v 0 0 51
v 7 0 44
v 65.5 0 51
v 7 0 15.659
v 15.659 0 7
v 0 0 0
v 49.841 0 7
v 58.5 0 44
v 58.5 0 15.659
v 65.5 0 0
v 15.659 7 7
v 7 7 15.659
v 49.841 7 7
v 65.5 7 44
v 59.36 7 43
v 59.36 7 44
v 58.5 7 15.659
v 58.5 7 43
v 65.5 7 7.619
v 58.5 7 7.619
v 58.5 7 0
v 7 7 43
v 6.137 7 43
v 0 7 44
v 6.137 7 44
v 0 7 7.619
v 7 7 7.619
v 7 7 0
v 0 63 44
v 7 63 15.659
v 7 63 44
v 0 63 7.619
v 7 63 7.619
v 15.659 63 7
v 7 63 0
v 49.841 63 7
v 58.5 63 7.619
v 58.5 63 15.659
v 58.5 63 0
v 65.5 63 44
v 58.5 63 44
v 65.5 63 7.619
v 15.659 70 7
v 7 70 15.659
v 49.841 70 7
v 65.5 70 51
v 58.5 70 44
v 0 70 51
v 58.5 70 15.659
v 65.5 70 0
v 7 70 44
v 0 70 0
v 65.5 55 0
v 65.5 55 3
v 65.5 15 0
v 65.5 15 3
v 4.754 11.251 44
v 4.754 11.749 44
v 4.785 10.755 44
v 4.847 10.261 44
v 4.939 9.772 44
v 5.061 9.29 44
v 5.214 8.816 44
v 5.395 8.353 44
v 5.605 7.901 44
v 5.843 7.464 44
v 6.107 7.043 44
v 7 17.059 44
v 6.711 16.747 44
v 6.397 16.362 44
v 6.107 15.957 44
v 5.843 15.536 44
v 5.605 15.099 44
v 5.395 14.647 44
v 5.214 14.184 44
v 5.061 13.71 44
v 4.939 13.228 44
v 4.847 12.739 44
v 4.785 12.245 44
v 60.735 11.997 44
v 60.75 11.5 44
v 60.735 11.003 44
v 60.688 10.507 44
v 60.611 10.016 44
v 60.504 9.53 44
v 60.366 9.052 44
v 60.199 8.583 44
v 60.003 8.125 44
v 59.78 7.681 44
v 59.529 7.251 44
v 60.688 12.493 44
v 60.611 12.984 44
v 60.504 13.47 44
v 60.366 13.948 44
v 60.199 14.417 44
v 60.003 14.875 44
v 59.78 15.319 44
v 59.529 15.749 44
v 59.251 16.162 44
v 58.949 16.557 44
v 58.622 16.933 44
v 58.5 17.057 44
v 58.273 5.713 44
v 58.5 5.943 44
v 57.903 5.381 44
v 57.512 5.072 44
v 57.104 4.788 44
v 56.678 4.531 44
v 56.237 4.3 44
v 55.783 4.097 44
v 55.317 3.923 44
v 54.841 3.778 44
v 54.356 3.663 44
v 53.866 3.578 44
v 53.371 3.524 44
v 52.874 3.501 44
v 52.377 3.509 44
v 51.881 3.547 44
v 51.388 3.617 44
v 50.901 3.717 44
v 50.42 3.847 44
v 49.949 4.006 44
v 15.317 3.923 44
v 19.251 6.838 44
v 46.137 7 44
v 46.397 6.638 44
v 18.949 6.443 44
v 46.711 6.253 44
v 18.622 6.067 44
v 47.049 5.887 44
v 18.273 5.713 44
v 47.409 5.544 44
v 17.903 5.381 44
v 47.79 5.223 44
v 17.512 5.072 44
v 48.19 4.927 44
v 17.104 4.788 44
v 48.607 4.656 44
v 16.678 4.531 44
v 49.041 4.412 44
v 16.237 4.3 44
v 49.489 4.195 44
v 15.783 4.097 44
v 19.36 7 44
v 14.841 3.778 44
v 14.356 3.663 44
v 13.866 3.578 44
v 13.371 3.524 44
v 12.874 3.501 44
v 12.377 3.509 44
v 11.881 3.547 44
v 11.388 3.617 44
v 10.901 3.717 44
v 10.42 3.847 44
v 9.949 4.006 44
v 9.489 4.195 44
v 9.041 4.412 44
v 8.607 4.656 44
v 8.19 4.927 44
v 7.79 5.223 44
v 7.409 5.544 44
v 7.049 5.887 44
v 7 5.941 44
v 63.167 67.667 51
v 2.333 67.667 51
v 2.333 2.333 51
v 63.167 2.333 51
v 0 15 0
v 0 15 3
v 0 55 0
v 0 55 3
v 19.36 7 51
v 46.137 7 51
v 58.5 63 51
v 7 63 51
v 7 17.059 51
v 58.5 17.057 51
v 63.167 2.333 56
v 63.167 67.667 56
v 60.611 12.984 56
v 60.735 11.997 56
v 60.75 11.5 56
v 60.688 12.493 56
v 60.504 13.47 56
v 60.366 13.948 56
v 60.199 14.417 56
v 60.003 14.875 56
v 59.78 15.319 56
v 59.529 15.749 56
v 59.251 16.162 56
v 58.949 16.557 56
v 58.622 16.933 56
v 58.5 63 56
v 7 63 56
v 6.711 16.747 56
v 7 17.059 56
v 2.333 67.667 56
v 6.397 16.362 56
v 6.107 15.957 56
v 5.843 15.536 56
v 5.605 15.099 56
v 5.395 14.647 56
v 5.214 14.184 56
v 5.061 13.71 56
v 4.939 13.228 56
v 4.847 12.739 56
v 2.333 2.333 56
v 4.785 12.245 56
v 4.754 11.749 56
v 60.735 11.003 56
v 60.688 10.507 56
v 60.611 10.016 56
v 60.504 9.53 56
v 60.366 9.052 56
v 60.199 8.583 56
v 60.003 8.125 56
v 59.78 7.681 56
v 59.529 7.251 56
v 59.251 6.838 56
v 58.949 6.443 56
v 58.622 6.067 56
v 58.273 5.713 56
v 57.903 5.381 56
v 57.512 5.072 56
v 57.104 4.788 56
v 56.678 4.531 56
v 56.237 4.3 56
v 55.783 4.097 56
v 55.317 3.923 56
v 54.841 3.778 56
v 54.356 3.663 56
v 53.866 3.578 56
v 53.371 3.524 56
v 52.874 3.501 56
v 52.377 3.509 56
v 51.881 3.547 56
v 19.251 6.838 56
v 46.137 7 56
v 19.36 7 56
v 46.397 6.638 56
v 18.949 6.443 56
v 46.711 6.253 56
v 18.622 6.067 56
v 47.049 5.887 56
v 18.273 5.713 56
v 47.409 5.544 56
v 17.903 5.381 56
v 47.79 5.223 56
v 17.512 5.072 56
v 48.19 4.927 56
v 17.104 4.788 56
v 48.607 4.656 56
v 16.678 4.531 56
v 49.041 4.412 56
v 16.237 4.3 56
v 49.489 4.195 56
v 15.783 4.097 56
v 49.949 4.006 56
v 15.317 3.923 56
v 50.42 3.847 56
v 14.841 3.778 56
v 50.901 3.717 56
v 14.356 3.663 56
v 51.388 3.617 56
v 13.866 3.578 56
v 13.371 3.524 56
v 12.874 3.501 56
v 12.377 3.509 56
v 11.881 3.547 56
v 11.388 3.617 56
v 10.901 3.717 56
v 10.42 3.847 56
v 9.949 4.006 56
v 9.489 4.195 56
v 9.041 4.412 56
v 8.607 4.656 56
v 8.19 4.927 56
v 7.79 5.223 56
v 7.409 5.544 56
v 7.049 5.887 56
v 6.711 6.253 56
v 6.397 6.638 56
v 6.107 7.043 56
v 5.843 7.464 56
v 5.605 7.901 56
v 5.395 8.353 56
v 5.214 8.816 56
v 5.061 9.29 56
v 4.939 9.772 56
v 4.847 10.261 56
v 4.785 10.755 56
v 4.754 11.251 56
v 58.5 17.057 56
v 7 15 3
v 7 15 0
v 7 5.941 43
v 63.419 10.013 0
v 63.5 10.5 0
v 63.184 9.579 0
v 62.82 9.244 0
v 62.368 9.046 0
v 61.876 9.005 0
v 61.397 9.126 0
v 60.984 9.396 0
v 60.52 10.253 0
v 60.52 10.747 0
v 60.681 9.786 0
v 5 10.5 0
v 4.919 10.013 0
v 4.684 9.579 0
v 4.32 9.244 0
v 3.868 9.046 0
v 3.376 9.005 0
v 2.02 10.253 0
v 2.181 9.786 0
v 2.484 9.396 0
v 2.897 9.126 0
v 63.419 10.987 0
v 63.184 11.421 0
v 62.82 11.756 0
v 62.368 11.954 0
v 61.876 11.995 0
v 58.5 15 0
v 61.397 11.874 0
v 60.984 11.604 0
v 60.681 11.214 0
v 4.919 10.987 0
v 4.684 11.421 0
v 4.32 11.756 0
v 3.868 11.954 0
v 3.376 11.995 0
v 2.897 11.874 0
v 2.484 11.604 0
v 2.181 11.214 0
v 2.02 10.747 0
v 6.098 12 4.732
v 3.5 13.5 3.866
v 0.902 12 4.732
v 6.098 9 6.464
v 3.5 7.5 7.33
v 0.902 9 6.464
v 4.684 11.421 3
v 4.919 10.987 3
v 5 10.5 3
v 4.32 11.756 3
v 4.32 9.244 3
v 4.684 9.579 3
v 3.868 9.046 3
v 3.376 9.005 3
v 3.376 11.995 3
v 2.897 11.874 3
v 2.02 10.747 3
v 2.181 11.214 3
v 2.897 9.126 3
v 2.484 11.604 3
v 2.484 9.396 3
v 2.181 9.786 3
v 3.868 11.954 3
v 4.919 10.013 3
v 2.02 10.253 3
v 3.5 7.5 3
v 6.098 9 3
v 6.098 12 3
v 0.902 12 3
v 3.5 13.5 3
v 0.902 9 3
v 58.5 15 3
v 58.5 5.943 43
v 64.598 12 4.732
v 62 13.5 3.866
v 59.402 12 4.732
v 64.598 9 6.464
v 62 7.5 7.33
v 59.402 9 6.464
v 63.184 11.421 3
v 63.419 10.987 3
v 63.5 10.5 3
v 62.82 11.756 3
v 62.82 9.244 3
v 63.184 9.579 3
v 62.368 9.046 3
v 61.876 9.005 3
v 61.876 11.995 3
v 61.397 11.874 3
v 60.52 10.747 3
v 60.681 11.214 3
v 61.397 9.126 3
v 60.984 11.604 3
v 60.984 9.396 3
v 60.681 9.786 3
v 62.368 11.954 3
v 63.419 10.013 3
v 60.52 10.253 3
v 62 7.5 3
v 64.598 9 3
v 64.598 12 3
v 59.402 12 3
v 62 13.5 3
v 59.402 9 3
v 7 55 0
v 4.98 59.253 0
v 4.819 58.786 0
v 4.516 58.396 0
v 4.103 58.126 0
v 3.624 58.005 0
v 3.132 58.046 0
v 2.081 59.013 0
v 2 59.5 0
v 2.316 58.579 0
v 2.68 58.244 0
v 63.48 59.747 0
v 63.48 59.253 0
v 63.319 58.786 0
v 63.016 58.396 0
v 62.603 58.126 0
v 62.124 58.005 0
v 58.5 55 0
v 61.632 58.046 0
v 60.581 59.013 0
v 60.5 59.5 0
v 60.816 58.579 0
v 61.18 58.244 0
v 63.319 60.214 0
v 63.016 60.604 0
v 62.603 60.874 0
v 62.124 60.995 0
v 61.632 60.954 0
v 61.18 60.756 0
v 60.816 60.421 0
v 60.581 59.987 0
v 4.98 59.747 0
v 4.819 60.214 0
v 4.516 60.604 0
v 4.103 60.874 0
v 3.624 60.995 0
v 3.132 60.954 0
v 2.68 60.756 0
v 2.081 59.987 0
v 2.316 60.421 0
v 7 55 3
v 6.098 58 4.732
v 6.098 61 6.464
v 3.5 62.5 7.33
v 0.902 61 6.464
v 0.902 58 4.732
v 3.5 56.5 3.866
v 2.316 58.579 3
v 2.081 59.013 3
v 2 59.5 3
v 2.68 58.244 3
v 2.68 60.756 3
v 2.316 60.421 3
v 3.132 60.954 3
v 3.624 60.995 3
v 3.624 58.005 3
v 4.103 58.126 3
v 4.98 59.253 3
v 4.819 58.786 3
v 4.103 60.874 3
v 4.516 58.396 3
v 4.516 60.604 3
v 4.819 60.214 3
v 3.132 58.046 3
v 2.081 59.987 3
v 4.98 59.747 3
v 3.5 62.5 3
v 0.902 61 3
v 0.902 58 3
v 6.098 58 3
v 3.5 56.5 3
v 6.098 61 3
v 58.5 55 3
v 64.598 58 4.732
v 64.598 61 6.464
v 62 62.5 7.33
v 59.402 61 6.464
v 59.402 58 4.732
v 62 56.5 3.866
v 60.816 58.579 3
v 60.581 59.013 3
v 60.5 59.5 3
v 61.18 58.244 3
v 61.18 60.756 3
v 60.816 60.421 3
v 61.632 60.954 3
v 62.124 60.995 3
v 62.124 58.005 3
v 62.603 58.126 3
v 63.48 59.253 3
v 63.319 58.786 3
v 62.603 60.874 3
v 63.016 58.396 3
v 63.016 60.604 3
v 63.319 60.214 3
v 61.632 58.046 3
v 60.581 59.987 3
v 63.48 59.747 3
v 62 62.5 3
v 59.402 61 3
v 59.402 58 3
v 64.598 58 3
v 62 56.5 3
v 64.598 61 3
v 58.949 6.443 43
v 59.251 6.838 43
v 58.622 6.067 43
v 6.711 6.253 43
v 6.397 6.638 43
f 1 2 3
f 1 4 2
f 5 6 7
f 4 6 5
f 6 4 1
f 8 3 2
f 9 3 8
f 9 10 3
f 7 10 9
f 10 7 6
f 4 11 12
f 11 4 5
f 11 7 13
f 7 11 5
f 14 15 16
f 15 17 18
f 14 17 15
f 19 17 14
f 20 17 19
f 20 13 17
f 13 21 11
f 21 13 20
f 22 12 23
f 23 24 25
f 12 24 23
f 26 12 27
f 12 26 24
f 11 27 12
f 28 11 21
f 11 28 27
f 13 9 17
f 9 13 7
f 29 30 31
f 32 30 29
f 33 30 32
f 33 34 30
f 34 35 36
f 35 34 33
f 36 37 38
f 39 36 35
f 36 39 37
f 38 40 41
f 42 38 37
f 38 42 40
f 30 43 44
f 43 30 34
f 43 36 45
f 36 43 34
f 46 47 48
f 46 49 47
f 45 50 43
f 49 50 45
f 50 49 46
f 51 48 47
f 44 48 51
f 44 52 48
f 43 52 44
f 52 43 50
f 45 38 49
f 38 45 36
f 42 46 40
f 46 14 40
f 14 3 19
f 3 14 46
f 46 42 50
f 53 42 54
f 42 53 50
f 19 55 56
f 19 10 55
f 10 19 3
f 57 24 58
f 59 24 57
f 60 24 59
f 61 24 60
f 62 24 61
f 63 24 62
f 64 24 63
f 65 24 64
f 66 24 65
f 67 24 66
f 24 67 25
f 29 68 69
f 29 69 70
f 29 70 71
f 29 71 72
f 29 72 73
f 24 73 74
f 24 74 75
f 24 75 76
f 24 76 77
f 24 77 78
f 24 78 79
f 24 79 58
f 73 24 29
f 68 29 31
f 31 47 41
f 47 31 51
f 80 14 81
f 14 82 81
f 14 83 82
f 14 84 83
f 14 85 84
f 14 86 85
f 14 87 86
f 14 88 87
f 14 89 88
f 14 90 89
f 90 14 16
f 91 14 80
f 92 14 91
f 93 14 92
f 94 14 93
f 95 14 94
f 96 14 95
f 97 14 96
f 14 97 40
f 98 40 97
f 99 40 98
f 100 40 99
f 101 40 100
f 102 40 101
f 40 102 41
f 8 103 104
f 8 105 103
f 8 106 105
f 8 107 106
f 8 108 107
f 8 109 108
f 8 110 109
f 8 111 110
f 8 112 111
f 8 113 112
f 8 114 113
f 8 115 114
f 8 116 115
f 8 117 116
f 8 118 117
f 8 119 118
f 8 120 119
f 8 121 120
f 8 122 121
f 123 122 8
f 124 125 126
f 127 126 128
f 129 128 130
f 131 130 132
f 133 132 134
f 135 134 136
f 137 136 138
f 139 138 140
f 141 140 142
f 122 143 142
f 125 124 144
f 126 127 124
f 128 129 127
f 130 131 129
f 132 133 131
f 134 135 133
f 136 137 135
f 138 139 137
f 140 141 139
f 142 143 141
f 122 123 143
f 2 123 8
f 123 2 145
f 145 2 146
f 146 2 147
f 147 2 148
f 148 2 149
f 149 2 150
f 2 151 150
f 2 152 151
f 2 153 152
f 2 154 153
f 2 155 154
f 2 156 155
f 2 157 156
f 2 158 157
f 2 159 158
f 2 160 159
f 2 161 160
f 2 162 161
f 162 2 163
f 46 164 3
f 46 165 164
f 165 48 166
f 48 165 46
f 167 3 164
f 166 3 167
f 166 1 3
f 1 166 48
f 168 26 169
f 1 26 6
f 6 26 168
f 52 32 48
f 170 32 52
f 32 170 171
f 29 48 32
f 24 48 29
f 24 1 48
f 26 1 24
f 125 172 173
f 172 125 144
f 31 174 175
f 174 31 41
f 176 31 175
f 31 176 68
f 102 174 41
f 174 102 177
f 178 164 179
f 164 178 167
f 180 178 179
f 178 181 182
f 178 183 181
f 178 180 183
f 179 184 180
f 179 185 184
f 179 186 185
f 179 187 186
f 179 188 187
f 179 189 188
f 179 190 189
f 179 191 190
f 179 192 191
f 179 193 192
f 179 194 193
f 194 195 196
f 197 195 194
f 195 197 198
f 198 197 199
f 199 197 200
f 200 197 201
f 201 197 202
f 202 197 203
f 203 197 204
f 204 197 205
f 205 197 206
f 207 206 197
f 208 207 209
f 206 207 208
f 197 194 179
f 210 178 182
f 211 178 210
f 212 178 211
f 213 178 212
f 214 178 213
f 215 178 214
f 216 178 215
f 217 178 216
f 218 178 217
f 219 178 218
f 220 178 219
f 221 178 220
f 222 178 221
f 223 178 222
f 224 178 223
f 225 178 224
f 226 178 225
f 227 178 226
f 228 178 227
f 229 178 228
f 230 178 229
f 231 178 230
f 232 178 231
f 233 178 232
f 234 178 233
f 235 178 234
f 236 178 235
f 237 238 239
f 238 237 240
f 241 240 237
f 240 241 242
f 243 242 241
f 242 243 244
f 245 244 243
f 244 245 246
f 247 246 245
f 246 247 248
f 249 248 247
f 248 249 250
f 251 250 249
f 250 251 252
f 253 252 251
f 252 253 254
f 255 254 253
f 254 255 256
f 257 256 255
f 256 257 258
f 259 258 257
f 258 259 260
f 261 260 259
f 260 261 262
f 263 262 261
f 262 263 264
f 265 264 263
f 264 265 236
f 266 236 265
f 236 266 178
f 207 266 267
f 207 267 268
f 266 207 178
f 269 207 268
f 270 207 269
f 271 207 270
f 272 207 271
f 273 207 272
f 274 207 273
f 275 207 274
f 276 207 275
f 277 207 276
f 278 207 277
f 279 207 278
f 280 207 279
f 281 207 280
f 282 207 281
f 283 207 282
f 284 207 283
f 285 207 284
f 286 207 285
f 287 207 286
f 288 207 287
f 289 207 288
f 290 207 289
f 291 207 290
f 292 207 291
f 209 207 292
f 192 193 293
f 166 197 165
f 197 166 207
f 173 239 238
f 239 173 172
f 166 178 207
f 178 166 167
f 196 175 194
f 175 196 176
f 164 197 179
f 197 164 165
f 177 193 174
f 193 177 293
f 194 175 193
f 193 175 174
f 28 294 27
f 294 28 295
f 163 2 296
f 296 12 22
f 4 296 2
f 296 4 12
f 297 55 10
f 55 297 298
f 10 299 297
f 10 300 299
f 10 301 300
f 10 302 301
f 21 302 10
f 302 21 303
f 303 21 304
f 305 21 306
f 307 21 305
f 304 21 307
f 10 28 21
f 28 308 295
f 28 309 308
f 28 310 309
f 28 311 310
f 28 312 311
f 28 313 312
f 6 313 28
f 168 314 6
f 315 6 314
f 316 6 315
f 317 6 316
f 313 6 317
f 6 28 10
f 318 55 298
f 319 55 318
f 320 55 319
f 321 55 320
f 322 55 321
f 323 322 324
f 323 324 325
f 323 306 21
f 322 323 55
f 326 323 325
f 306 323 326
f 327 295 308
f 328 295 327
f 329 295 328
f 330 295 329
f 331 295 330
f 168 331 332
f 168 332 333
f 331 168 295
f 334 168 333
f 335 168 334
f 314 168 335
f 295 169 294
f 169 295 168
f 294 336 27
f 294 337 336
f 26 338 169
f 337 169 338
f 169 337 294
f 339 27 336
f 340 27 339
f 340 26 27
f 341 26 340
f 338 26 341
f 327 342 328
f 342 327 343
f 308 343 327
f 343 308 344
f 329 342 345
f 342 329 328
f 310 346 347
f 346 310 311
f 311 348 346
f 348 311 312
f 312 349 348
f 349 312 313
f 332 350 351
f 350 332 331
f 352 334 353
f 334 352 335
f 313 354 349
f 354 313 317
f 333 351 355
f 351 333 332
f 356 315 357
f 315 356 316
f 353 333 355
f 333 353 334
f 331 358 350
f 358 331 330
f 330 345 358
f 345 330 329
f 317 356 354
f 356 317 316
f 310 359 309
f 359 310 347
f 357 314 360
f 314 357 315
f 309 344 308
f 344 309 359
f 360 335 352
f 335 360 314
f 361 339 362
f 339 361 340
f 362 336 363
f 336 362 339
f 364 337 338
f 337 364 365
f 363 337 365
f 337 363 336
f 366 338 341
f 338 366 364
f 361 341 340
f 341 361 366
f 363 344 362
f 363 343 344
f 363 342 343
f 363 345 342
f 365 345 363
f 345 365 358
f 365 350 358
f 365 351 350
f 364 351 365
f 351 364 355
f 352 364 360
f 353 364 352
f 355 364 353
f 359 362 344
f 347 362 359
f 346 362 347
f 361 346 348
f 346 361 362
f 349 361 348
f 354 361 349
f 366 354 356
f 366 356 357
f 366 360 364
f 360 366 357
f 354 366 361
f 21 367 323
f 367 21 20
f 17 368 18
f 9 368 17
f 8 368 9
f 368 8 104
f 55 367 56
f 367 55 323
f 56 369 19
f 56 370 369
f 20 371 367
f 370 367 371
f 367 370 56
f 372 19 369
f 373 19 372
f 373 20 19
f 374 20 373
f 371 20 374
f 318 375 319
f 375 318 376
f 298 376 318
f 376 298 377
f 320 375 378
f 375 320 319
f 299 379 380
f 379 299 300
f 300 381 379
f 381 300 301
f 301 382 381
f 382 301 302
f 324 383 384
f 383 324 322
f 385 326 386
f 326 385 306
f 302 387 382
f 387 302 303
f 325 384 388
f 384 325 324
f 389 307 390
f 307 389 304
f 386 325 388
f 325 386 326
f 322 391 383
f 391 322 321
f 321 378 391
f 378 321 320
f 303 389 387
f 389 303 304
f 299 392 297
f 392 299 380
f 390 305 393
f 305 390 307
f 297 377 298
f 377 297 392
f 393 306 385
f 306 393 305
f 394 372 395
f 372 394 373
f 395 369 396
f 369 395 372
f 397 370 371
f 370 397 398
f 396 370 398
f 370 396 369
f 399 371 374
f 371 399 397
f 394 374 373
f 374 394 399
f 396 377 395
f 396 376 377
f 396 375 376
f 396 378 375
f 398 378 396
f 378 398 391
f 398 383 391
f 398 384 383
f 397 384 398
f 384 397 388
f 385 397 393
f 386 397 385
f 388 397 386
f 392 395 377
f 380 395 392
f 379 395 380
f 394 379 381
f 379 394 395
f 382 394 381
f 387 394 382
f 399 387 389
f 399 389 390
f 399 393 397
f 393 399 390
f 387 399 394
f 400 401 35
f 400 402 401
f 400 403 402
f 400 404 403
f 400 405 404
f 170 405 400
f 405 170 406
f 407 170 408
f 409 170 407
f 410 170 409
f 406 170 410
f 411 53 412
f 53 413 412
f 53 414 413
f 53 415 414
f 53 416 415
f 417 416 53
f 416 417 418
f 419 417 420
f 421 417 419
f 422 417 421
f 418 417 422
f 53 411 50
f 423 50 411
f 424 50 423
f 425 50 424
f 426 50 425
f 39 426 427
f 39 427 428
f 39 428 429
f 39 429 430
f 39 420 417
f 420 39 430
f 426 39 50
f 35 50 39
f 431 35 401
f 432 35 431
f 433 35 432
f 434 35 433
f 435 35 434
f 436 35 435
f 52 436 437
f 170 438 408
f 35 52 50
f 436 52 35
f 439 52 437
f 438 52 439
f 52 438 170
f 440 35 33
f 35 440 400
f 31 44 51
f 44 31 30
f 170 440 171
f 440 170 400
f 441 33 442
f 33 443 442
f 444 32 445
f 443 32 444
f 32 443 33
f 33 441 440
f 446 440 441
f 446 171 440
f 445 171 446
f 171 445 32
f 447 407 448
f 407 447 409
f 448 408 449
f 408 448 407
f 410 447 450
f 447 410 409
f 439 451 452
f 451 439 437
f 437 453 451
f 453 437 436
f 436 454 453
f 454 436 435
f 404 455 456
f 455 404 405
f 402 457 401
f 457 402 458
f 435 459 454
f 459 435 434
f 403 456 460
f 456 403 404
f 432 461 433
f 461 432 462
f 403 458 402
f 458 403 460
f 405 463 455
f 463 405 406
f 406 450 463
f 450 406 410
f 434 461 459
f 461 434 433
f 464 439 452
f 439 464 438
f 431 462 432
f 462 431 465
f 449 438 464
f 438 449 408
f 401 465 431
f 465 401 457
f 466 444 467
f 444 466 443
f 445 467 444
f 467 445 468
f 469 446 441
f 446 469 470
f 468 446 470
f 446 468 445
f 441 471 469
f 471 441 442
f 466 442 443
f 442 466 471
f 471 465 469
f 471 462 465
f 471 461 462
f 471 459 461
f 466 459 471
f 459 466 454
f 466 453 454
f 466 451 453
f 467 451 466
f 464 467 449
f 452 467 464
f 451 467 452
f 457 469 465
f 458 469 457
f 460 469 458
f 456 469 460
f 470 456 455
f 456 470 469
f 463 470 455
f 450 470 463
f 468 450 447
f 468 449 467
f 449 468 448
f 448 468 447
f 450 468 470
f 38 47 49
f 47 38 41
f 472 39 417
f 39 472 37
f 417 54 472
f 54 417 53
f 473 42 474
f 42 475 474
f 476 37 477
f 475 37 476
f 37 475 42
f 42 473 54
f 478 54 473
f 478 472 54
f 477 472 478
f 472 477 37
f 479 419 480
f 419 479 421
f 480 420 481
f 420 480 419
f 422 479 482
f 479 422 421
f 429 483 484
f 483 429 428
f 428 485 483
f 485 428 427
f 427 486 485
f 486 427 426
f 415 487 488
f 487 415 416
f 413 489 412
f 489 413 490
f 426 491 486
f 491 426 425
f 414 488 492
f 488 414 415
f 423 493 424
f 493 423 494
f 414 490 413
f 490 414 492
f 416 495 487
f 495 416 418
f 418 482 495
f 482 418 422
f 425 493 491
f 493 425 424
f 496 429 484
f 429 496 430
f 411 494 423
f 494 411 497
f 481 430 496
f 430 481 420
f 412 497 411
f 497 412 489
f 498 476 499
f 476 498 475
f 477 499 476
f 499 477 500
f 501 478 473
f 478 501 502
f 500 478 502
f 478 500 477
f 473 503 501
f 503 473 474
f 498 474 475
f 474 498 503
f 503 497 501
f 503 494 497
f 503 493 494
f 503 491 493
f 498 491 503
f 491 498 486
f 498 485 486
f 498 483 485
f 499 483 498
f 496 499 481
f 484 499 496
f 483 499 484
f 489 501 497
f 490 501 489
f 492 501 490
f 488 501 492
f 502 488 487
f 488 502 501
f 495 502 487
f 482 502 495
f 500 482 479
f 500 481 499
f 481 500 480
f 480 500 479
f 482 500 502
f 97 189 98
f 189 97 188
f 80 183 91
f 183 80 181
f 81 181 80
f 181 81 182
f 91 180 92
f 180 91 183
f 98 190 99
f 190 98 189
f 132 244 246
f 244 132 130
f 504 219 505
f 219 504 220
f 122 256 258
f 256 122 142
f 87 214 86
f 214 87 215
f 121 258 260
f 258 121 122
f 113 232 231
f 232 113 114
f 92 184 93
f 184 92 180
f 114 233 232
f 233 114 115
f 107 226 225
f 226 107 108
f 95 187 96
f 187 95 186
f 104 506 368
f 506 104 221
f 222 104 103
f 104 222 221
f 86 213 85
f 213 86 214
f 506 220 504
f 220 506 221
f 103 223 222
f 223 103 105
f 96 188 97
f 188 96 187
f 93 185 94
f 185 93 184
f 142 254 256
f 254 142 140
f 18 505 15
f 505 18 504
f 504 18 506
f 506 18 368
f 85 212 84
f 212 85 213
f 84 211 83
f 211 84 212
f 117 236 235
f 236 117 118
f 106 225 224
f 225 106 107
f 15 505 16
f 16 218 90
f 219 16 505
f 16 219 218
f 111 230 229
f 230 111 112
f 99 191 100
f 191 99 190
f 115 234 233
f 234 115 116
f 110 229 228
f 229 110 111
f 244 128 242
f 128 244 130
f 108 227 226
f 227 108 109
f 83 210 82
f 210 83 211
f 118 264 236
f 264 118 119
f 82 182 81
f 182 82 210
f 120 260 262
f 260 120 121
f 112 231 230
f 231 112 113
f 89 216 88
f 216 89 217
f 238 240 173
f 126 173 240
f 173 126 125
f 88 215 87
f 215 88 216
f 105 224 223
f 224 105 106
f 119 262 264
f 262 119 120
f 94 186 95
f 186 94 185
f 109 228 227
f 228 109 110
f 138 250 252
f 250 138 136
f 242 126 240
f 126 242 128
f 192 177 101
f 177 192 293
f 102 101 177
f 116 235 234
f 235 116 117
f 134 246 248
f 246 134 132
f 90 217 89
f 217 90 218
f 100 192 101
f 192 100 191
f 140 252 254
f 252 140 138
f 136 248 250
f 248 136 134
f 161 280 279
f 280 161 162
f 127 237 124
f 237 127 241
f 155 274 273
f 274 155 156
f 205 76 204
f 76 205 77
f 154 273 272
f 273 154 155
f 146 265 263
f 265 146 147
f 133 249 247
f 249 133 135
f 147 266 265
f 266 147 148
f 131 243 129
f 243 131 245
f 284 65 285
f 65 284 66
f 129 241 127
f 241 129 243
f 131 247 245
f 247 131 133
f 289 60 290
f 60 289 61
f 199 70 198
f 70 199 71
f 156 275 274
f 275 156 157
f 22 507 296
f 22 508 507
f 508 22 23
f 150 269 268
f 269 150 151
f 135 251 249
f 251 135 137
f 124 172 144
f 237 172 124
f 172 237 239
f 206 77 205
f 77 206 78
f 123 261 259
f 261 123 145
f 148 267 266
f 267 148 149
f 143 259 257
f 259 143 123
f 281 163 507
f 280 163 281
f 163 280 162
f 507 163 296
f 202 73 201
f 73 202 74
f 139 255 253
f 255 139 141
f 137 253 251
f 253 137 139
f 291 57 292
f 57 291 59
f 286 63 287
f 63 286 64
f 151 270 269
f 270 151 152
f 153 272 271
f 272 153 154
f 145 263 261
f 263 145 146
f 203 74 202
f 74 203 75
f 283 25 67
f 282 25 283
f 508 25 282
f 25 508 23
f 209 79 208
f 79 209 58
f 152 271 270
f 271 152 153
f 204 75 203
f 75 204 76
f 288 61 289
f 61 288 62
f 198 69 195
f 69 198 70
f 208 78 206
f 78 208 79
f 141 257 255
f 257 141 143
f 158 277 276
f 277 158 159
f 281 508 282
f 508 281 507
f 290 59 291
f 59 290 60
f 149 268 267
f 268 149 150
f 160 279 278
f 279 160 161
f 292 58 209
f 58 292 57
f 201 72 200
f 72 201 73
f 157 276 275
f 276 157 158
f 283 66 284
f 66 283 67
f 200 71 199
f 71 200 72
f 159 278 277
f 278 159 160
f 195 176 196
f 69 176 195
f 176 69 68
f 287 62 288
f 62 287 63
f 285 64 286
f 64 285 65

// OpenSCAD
// file: prism.scad
module prism(l, w, h) {
       polyhedron(points=[
               [0,0,h],           // 0    front top corner
               [0,0,0],[w,0,0],   // 1, 2 front left & right bottom corners
               [0,l,h],           // 3    back top corner
               [0,l,0],[w,l,0]    // 4, 5 back left & right bottom corners
       ], faces=[ // points for all faces must be ordered clockwise when looking in
               [0,2,1],    // top face
               [3,4,5],    // base face
               [0,1,4,3],  // h face
               [1,2,5,4],  // w face
               [0,3,5,2],  // hypotenuse face
       ]);
}

//rotate([180,0,0]) prism(l=5, w=3, h=5);
// main file
/*

Structure that connects to the Raspberry Pi and holds the camera translation stage above it. 
top.scad fits onto the top, the cylindrical spaces in the fitting make room for screws.

*/

include <prism.scad>;

$fa = 0.5;
$fs = 0.5;

bolt_separation = 49;

//height of the setup, NOT including the "fitting"
height = 51;

//dimensions of the "feet", part of the legs which stick out and have holes to attach to the Raspberry Pi
foot_width = 7;
foot_length = 6 + 0.5 + 0.5 + 1;
foot_thickness = 3;
//radii of the holes in the feet
foot_r = 1.5;
nut_r = 3;

//distance by which the structure is larger than the Raspberry Pi board, which therefore corresponds to the thickness of the legs ang "beam" which connect the legs
extra = 7;

//the - 1 is since the holes in the feel arent at foot_length/2 but at foot_length/2 - 0.5.
top_width = bolt_separation + 2*extra + foot_length - 1;
//the last +0.5 is tolerance so that the legs aren't that close to the actual LEDs
top_length = 58 + 3 + 3 + 0.5 + 0.5 + 0.5;
top_length = (58 + 3 + 3 + 0.5 + 0.5) + 0.5;
top_thickness = 2;

total_length = 85;
beam_height = extra;
fitting_height = 5;
//the corresponding fitting on top.scad is extra/3 minus some tolerance
fitting_width = extra/3*2;

angle = 30;
prism_height = (foot_length+extra) * tan(angle);

hole_height = 2.5;
hole_r = 2;

module leg(){
    
    difference(){
        union(){
            //foot
            cube([foot_width,foot_length+extra,foot_thickness]);
            //leg
            cube([foot_width, extra, height]);
            //prism
            rotate([0,0,90]) translate([0,-foot_width,foot_thickness]) prism(foot_width,foot_length + extra,prism_height);
        };
        
        translate([foot_width/2, extra+foot_length/2 - 0.5,-1]) 
        union(){
           cylinder(r=foot_r, h=foot_thickness+2);
           translate([0,0,1+foot_thickness]) rotate([0,0,30]) cylinder(r=nut_r, h=prism_height, $fn = 6);
        };
    };
};


// beam refers to the horizontal cuboids that connect the "legs"
module beam(length){
    cube([length,extra,beam_height]); 
};

// fitting refers to the square at the top of the structure, that is meant to fit into the "fitting" on top.scad
module fitting(width,length,thickness){
    cube([length,thickness,fitting_height]);
    cube([thickness,width,fitting_height]);
    translate([length-thickness,0,0]) cube([thickness,width,fitting_height]);
    translate([0,width-thickness,0]) cube([length,thickness,fitting_height]);
}






//lower beams
beam(top_length);
translate([0,top_width-extra,0]) beam(top_length);
union(){
        translate([foot_width-0.001,0,beam_height]) prism(extra,prism_height,prism_height);
        rotate([0,0,180]) translate([-0.001-top_length+foot_width,-extra,beam_height]) prism(extra,prism_height,prism_height);
    };
translate([0,top_width-extra,0]) union(){
        translate([foot_width-0.001,0,beam_height]) prism(extra,prism_height,prism_height);
        rotate([0,0,180]) translate([-0.001-top_length+foot_width,-extra,beam_height]) prism(extra,prism_height,prism_height);
    };


difference(){
    union(){
        //higher beams
        translate([0,extra,height]) rotate([180,0,0]){
            beam(top_length);
            translate([0,-top_width+extra,0]) beam(top_length);
        };
        translate([0,0,height]) rotate([180,0,90]){
            beam(top_width);
            translate([0,top_length-foot_width,0]) beam(top_width);
            
        };



        //fitting
        translate([foot_width-fitting_width,extra-fitting_width,height]) fitting(length=top_length-2*foot_width+2*fitting_width, width = top_width-2*extra+2*fitting_width,thickness = fitting_width);
        
        //make 4 legs in the correct positions
        leg();
        translate([top_length-foot_width,0,0]) leg();
        translate([foot_width,top_width,0]) rotate([0,0,180]) leg();
        translate([top_length,top_width,0]) rotate([0,0,180]) leg();
    };
    
    //Cutouts for the screws used to attach the translation stage to the top.scad. These values should be the same as in top.scad.
    aperture_x = top_length/2;
    aperture_y = top_width/2 -1;
    attachment_separation = 40;
    attachment_r = 9;
    aperture_to_attachment = 22.5;

    translate([0,0,height-2]){
        translate([aperture_x+attachment_separation/2,aperture_y-aperture_to_attachment,-fitting_height-1]) cylinder(r=attachment_r-1,h=top_thickness+fitting_height+8);
        translate([aperture_x-attachment_separation/2,aperture_y-aperture_to_attachment,-fitting_height-1]) cylinder(r=attachment_r-1,h=top_thickness+fitting_height+8);
    }
    };
